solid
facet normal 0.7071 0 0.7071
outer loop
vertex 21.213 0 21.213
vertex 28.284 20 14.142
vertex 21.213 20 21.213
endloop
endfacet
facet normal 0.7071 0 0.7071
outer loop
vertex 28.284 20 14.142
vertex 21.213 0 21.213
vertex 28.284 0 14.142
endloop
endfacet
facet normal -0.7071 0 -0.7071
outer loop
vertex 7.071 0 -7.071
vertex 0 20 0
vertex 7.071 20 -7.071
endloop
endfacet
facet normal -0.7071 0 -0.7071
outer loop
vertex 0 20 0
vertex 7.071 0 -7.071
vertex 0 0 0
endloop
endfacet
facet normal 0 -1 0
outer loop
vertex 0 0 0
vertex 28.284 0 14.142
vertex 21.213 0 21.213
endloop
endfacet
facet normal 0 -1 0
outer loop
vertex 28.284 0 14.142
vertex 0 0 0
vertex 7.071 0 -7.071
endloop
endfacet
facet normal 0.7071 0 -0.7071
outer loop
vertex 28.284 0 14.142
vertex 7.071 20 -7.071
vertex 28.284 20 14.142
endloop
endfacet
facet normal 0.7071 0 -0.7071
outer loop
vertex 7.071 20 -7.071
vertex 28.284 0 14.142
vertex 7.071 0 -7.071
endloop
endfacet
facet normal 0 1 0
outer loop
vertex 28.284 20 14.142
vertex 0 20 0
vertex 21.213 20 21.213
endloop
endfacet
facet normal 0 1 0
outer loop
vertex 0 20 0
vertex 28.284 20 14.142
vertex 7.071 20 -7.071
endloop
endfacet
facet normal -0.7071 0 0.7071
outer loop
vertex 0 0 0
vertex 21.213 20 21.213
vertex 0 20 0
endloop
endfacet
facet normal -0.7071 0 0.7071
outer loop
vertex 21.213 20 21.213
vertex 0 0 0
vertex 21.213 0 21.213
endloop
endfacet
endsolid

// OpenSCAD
// Generated by scadwright. Do not hand-edit —
// edit the Python source and regenerate.

rotate([0, 45, 0]) {
    cube([10, 20, 30], center=false);
}
